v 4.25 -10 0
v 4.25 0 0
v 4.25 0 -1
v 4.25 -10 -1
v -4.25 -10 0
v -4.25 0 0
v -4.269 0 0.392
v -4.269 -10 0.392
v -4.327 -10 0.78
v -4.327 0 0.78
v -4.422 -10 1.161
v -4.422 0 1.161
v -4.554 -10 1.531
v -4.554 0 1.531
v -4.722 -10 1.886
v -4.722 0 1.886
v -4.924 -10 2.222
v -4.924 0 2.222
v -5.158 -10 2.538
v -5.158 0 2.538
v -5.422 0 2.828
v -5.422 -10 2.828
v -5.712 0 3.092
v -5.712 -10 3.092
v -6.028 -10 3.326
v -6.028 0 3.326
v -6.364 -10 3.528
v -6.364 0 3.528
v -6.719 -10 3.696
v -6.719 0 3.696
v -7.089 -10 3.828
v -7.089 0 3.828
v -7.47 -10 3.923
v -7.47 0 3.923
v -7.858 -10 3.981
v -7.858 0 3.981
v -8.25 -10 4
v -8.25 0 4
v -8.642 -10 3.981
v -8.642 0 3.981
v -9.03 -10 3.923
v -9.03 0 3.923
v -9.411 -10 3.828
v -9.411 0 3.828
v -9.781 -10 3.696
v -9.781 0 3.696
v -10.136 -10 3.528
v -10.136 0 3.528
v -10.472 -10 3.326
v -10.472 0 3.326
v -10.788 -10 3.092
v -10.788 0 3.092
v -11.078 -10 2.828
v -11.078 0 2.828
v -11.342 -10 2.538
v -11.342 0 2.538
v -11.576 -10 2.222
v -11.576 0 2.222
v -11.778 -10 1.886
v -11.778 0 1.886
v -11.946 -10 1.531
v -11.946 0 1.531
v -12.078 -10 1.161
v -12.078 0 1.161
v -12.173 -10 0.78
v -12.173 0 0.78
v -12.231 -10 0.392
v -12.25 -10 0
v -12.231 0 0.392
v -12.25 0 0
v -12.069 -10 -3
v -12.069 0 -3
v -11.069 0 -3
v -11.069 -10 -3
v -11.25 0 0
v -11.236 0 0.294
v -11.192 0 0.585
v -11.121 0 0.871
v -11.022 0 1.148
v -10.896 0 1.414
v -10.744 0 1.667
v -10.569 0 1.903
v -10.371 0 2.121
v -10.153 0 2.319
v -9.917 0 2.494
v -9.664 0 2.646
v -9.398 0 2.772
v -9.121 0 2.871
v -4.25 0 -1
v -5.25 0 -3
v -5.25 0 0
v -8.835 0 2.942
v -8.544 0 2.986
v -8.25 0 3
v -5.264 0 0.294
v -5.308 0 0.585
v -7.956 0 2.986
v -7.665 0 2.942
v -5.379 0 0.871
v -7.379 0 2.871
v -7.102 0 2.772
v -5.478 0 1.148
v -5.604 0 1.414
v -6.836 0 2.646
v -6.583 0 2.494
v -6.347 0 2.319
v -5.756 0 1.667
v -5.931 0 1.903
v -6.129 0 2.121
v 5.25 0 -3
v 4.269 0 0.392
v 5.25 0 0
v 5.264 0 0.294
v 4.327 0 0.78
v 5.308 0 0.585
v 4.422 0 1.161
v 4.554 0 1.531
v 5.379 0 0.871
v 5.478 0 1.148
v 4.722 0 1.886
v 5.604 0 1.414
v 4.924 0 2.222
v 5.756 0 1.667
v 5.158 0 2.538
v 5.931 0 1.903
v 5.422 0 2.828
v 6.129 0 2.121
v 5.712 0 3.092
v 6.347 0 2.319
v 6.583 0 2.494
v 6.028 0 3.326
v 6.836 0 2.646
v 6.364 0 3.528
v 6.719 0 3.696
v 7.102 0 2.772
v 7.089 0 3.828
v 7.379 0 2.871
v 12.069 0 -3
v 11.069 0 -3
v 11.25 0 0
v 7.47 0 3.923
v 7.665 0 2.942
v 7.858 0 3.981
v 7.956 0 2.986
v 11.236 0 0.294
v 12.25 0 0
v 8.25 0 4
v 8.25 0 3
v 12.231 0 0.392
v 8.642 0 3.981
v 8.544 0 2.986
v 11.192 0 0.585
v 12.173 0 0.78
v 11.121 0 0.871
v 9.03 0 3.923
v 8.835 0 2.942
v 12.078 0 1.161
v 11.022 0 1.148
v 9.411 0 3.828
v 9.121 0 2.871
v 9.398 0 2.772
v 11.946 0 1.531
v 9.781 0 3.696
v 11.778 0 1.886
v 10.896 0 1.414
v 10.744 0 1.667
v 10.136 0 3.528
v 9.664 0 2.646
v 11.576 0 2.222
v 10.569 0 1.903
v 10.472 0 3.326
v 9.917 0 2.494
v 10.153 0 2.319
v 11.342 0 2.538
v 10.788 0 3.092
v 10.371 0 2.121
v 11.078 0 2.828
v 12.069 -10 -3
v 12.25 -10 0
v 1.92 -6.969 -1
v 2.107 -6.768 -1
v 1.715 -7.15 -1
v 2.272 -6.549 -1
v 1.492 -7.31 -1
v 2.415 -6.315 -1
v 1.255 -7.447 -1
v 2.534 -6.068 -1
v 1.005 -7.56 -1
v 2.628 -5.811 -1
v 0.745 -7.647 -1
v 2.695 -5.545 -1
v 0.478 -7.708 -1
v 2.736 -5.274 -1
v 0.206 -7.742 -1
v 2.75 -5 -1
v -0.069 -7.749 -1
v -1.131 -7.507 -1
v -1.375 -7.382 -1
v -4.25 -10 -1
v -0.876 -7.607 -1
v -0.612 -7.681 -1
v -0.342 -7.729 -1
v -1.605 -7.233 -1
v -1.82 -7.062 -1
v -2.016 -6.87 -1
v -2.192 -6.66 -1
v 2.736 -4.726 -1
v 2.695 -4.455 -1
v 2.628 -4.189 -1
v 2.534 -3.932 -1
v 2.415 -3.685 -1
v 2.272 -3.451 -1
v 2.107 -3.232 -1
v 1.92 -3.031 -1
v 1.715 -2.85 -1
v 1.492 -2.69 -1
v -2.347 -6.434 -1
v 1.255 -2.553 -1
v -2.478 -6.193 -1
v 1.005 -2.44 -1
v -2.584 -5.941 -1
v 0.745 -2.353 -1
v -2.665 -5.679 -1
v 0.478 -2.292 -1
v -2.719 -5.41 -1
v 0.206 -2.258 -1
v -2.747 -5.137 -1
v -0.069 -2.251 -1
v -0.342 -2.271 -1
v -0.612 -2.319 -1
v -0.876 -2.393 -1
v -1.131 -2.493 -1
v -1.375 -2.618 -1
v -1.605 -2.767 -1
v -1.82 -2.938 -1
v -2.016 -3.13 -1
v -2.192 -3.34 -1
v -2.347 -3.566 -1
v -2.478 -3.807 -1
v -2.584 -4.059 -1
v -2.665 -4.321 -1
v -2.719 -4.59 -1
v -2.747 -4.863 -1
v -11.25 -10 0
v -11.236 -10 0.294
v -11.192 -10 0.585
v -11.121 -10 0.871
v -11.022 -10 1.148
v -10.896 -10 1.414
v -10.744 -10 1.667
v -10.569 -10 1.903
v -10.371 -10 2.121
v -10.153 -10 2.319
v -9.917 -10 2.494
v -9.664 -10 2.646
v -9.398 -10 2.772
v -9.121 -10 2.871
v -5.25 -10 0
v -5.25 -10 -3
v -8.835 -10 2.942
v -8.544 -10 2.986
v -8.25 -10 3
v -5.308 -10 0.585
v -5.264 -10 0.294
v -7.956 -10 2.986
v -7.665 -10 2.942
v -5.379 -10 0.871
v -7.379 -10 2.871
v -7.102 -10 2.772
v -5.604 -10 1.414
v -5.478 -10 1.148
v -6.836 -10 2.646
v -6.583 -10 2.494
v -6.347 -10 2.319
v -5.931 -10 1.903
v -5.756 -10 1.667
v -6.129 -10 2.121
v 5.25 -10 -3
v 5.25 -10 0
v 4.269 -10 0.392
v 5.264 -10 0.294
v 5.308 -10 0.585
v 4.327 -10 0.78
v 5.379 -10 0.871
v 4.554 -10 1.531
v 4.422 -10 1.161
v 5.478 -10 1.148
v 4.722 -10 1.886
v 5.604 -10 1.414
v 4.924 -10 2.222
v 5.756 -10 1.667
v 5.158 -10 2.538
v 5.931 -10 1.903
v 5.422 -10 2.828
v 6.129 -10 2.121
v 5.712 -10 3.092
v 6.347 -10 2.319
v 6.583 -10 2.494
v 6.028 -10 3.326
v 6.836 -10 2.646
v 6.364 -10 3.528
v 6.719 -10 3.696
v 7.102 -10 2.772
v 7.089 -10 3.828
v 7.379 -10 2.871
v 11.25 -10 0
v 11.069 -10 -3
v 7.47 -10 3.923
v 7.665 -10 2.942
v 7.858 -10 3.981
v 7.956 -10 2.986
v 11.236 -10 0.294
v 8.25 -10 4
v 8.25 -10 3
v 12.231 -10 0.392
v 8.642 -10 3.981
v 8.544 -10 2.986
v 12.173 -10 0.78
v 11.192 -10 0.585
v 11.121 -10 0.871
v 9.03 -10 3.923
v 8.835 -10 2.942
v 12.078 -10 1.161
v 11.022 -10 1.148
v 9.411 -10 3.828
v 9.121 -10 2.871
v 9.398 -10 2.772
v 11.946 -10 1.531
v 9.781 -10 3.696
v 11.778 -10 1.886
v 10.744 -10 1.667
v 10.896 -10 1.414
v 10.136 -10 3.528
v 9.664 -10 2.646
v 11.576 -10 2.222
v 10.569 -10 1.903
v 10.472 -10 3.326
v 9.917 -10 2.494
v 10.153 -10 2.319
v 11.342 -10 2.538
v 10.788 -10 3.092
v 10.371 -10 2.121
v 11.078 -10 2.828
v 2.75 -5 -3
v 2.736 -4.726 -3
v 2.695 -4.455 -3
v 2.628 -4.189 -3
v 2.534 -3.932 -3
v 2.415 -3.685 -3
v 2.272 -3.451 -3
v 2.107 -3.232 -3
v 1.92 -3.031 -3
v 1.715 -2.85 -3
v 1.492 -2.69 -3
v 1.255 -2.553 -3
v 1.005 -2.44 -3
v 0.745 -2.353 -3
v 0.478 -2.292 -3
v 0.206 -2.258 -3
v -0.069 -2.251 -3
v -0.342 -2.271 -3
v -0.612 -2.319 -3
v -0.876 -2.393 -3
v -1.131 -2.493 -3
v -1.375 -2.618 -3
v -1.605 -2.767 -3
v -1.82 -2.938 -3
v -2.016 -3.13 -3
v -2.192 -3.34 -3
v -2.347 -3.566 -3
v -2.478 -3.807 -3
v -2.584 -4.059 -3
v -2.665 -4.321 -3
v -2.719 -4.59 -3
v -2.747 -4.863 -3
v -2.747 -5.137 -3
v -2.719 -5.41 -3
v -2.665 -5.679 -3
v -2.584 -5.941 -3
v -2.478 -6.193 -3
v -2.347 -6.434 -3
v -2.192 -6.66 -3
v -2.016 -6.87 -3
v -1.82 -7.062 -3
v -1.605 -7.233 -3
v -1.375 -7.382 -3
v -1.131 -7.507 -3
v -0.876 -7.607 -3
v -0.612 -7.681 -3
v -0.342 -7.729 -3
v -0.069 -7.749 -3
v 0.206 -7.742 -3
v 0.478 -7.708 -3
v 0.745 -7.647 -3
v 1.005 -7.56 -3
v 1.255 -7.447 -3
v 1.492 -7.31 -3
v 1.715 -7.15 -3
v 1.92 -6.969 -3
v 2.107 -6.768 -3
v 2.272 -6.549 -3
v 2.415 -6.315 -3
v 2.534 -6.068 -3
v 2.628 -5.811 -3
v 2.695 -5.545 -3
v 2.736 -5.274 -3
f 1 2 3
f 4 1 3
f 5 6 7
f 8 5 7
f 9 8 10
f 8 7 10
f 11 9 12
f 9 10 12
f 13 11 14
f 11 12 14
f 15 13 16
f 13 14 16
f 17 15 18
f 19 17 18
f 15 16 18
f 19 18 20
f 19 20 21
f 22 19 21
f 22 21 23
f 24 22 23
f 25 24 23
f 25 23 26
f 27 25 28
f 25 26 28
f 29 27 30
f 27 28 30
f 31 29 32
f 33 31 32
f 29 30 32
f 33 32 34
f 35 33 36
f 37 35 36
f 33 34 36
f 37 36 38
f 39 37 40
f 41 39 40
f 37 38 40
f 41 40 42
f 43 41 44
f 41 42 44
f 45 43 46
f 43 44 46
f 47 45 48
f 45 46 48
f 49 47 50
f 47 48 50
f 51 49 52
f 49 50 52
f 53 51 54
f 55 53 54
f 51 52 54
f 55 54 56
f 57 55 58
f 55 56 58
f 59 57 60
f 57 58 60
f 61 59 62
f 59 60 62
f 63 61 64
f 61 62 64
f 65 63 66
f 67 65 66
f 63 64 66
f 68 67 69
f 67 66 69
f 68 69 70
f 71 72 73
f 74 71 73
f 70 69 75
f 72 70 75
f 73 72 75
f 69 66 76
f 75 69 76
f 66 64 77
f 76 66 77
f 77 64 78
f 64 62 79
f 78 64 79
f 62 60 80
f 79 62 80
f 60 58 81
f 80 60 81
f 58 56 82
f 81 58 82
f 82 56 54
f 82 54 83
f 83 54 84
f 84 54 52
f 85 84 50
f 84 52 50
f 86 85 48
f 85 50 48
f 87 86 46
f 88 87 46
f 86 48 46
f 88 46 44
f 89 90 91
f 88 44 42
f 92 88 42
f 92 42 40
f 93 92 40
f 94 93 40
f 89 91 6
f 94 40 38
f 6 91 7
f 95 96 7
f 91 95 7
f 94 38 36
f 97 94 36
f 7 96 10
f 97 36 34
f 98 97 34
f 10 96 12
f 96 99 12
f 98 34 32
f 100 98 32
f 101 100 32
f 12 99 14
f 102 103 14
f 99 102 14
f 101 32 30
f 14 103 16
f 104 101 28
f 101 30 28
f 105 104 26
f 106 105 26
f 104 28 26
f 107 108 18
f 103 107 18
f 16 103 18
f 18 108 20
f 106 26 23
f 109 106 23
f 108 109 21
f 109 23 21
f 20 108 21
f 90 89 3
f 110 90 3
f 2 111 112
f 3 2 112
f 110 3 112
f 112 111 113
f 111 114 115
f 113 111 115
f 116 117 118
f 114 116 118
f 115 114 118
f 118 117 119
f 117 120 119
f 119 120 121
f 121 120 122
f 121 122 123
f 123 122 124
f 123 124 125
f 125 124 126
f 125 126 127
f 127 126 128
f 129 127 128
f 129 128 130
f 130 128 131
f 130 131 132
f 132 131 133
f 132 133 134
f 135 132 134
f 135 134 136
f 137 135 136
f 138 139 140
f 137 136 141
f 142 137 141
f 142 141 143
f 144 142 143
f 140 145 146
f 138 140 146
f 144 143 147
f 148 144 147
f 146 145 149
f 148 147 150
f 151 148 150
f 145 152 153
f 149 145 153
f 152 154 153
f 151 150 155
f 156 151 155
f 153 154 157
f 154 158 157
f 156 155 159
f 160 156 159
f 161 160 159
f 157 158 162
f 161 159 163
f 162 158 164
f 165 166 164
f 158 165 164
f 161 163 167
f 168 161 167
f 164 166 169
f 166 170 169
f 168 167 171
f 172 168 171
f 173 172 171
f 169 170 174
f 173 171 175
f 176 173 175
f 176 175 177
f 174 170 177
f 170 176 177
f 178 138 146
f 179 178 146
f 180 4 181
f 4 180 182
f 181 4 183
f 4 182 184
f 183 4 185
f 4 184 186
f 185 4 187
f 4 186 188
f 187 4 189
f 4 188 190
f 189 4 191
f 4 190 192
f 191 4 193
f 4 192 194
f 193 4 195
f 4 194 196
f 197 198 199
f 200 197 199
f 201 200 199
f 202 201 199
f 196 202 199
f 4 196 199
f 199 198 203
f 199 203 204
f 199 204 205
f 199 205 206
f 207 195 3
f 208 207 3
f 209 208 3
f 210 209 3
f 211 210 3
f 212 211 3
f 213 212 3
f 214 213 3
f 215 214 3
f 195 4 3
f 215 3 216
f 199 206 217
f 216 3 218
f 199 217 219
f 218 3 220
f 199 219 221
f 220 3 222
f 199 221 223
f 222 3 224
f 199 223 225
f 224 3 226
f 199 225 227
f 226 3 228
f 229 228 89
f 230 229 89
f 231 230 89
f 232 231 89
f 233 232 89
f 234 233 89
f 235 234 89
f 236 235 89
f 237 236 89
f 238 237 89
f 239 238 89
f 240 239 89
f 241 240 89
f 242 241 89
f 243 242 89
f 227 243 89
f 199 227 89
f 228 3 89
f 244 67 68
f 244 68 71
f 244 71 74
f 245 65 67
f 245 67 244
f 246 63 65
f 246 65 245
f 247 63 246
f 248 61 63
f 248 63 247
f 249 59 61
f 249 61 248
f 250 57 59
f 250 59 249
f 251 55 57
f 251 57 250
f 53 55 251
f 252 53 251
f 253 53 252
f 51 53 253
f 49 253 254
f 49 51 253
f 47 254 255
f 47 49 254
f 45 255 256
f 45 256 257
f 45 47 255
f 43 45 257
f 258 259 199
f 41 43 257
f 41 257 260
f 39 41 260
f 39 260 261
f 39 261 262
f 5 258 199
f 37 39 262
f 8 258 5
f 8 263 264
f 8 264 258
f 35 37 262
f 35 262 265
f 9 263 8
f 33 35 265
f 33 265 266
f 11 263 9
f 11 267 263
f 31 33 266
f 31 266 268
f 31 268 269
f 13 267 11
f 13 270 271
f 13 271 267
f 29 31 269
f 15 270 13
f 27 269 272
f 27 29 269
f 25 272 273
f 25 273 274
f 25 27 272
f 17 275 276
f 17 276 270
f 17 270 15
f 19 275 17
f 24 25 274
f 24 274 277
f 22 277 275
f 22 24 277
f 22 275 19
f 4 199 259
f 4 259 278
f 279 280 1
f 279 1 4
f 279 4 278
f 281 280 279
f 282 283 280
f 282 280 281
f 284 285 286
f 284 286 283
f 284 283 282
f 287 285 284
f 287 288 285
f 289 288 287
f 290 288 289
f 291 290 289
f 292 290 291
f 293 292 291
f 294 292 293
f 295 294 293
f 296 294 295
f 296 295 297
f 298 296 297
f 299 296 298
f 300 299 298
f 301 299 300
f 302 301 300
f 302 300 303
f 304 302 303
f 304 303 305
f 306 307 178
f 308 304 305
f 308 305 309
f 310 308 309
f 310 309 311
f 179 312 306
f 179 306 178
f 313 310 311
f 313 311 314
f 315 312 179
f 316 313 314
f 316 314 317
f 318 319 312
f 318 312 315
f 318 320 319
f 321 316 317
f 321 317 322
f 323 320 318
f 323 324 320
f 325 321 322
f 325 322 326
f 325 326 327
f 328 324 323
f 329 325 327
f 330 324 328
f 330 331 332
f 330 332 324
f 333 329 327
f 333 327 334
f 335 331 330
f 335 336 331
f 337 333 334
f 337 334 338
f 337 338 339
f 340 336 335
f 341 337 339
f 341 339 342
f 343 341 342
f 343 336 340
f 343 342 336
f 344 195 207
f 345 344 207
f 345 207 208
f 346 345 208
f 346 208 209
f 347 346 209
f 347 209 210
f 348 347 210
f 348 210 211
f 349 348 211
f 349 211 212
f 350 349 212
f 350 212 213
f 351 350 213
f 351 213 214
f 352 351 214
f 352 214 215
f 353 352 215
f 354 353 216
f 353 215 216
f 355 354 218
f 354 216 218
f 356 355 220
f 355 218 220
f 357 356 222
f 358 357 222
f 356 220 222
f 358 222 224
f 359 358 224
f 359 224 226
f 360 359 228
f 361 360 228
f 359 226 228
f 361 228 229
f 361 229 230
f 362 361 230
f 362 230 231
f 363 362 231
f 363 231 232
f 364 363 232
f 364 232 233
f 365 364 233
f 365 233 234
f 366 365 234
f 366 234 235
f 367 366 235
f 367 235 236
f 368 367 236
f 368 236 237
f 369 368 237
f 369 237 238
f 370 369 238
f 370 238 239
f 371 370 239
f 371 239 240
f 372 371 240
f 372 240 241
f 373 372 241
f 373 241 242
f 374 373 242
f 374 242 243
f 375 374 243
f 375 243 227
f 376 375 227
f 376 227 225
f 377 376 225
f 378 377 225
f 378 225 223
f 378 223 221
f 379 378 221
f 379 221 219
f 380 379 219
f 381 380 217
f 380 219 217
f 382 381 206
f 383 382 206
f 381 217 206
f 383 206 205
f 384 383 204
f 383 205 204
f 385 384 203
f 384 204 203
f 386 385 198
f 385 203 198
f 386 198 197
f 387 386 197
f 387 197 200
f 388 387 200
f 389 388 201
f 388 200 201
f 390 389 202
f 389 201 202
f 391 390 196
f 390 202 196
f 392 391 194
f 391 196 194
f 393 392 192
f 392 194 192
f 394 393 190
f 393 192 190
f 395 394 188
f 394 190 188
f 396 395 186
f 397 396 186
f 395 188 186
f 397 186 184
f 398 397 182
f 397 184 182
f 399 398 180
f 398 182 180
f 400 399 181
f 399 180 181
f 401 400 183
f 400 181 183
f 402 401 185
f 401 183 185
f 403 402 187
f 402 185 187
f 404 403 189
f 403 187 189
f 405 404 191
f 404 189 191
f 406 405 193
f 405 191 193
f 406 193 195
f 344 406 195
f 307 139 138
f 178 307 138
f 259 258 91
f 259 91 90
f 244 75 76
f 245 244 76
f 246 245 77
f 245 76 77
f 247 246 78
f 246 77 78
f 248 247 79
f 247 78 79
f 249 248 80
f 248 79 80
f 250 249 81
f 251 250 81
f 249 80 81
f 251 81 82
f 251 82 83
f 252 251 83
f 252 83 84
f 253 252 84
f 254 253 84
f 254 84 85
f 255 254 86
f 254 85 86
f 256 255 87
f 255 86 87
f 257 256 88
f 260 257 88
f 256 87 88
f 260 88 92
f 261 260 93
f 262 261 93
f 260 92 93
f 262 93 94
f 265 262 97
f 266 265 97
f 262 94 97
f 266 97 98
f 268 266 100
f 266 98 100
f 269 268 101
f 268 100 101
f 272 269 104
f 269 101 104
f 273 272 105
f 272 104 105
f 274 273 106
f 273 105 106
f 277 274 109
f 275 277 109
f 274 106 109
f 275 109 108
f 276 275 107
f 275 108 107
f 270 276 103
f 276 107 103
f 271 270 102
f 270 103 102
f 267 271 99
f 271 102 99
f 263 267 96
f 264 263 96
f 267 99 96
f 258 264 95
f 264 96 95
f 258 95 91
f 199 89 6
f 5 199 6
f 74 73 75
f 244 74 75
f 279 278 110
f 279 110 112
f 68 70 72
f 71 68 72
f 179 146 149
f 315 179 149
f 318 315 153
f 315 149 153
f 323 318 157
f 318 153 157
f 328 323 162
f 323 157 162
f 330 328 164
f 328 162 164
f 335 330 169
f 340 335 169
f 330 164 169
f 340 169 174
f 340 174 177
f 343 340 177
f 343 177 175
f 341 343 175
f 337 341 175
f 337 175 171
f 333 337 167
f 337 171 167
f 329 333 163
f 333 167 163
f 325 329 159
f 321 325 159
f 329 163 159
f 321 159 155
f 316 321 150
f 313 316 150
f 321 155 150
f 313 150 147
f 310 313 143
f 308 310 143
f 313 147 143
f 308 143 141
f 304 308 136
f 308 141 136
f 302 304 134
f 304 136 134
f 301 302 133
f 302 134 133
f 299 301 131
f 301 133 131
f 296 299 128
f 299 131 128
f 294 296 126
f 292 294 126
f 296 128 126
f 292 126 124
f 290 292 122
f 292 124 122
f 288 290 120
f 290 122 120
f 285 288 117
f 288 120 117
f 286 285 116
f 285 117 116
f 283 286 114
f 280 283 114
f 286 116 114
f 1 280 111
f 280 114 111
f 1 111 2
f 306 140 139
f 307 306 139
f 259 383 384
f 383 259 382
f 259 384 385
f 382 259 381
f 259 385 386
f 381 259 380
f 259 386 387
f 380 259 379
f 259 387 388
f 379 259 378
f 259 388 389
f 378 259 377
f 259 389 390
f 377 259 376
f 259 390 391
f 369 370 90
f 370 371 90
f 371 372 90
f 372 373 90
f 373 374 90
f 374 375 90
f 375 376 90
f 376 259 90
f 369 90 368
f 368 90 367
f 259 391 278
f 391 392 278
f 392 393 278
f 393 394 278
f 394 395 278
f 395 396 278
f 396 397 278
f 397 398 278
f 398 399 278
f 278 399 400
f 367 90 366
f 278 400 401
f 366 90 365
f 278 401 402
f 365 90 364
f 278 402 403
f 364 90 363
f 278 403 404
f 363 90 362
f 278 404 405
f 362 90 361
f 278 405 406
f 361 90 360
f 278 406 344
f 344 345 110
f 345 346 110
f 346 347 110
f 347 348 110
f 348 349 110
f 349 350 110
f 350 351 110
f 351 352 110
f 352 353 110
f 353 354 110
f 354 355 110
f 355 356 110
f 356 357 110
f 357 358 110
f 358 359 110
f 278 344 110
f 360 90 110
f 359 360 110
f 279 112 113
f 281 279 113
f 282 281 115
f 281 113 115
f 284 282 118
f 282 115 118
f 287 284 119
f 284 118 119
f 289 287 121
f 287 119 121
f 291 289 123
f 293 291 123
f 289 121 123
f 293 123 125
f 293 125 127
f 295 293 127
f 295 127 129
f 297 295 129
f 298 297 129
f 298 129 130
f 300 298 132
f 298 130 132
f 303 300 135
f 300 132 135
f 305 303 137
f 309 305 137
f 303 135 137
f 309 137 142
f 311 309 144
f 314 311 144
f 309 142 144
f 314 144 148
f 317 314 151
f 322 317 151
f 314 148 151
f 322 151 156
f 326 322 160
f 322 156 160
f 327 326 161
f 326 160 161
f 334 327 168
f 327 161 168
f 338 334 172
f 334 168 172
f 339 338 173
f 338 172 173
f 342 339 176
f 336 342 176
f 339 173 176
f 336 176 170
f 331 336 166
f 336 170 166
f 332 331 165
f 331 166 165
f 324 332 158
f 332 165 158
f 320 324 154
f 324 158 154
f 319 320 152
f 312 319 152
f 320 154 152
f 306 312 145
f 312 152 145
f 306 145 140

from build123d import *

# Parameters (mm, degrees)
F1_DEPTH = 10
F2_R     = 2.75
F3_DEPTH = 2.5


with BuildPart() as f1:
    # F0 (on Front) → F1 (new body)
    with BuildSketch(Plane.XZ):
        with BuildLine():
            ThreePointArc((-4.25, 0), (-8.25, 4), (-12.25, 0))
            Line((-12.25, 0), (-12.069366, -3))
            Line((-12.069366, -3), (-11.069366, -3))
            Line((-11.069366, -3), (-11.25, 0))
            ThreePointArc((-11.25, 0), (-8.25, 3), (-5.25, 0))
            Line((-5.25, 0), (-5.25, -3))
            Line((-5.25, -3), (5.25, -3))
            Line((5.25, -3), (5.25, 0))
            ThreePointArc((5.25, 0), (8.25, 3), (11.25, 0))
            Line((11.25, 0), (11.069366, -3))
            Line((11.069366, -3), (12.069366, -3))
            Line((12.069366, -3), (12.25, 0))
            ThreePointArc((12.25, 0), (8.25, 4), (4.25, 0))
            Line((4.25, 0), (4.25, -1))
            Line((4.25, -1), (-4.25, -1))
            Line((-4.25, -1), (-4.25, 0))
        make_face()
    extrude(amount=F1_DEPTH)

    # F2 (on face) → F3 (cut)
    with BuildSketch(Plane.XY.offset(-1)):
        with Locations((0, -5)):
            Circle(F2_R)
    extrude(amount=-F3_DEPTH, mode=Mode.SUBTRACT)


solid = f1.part
